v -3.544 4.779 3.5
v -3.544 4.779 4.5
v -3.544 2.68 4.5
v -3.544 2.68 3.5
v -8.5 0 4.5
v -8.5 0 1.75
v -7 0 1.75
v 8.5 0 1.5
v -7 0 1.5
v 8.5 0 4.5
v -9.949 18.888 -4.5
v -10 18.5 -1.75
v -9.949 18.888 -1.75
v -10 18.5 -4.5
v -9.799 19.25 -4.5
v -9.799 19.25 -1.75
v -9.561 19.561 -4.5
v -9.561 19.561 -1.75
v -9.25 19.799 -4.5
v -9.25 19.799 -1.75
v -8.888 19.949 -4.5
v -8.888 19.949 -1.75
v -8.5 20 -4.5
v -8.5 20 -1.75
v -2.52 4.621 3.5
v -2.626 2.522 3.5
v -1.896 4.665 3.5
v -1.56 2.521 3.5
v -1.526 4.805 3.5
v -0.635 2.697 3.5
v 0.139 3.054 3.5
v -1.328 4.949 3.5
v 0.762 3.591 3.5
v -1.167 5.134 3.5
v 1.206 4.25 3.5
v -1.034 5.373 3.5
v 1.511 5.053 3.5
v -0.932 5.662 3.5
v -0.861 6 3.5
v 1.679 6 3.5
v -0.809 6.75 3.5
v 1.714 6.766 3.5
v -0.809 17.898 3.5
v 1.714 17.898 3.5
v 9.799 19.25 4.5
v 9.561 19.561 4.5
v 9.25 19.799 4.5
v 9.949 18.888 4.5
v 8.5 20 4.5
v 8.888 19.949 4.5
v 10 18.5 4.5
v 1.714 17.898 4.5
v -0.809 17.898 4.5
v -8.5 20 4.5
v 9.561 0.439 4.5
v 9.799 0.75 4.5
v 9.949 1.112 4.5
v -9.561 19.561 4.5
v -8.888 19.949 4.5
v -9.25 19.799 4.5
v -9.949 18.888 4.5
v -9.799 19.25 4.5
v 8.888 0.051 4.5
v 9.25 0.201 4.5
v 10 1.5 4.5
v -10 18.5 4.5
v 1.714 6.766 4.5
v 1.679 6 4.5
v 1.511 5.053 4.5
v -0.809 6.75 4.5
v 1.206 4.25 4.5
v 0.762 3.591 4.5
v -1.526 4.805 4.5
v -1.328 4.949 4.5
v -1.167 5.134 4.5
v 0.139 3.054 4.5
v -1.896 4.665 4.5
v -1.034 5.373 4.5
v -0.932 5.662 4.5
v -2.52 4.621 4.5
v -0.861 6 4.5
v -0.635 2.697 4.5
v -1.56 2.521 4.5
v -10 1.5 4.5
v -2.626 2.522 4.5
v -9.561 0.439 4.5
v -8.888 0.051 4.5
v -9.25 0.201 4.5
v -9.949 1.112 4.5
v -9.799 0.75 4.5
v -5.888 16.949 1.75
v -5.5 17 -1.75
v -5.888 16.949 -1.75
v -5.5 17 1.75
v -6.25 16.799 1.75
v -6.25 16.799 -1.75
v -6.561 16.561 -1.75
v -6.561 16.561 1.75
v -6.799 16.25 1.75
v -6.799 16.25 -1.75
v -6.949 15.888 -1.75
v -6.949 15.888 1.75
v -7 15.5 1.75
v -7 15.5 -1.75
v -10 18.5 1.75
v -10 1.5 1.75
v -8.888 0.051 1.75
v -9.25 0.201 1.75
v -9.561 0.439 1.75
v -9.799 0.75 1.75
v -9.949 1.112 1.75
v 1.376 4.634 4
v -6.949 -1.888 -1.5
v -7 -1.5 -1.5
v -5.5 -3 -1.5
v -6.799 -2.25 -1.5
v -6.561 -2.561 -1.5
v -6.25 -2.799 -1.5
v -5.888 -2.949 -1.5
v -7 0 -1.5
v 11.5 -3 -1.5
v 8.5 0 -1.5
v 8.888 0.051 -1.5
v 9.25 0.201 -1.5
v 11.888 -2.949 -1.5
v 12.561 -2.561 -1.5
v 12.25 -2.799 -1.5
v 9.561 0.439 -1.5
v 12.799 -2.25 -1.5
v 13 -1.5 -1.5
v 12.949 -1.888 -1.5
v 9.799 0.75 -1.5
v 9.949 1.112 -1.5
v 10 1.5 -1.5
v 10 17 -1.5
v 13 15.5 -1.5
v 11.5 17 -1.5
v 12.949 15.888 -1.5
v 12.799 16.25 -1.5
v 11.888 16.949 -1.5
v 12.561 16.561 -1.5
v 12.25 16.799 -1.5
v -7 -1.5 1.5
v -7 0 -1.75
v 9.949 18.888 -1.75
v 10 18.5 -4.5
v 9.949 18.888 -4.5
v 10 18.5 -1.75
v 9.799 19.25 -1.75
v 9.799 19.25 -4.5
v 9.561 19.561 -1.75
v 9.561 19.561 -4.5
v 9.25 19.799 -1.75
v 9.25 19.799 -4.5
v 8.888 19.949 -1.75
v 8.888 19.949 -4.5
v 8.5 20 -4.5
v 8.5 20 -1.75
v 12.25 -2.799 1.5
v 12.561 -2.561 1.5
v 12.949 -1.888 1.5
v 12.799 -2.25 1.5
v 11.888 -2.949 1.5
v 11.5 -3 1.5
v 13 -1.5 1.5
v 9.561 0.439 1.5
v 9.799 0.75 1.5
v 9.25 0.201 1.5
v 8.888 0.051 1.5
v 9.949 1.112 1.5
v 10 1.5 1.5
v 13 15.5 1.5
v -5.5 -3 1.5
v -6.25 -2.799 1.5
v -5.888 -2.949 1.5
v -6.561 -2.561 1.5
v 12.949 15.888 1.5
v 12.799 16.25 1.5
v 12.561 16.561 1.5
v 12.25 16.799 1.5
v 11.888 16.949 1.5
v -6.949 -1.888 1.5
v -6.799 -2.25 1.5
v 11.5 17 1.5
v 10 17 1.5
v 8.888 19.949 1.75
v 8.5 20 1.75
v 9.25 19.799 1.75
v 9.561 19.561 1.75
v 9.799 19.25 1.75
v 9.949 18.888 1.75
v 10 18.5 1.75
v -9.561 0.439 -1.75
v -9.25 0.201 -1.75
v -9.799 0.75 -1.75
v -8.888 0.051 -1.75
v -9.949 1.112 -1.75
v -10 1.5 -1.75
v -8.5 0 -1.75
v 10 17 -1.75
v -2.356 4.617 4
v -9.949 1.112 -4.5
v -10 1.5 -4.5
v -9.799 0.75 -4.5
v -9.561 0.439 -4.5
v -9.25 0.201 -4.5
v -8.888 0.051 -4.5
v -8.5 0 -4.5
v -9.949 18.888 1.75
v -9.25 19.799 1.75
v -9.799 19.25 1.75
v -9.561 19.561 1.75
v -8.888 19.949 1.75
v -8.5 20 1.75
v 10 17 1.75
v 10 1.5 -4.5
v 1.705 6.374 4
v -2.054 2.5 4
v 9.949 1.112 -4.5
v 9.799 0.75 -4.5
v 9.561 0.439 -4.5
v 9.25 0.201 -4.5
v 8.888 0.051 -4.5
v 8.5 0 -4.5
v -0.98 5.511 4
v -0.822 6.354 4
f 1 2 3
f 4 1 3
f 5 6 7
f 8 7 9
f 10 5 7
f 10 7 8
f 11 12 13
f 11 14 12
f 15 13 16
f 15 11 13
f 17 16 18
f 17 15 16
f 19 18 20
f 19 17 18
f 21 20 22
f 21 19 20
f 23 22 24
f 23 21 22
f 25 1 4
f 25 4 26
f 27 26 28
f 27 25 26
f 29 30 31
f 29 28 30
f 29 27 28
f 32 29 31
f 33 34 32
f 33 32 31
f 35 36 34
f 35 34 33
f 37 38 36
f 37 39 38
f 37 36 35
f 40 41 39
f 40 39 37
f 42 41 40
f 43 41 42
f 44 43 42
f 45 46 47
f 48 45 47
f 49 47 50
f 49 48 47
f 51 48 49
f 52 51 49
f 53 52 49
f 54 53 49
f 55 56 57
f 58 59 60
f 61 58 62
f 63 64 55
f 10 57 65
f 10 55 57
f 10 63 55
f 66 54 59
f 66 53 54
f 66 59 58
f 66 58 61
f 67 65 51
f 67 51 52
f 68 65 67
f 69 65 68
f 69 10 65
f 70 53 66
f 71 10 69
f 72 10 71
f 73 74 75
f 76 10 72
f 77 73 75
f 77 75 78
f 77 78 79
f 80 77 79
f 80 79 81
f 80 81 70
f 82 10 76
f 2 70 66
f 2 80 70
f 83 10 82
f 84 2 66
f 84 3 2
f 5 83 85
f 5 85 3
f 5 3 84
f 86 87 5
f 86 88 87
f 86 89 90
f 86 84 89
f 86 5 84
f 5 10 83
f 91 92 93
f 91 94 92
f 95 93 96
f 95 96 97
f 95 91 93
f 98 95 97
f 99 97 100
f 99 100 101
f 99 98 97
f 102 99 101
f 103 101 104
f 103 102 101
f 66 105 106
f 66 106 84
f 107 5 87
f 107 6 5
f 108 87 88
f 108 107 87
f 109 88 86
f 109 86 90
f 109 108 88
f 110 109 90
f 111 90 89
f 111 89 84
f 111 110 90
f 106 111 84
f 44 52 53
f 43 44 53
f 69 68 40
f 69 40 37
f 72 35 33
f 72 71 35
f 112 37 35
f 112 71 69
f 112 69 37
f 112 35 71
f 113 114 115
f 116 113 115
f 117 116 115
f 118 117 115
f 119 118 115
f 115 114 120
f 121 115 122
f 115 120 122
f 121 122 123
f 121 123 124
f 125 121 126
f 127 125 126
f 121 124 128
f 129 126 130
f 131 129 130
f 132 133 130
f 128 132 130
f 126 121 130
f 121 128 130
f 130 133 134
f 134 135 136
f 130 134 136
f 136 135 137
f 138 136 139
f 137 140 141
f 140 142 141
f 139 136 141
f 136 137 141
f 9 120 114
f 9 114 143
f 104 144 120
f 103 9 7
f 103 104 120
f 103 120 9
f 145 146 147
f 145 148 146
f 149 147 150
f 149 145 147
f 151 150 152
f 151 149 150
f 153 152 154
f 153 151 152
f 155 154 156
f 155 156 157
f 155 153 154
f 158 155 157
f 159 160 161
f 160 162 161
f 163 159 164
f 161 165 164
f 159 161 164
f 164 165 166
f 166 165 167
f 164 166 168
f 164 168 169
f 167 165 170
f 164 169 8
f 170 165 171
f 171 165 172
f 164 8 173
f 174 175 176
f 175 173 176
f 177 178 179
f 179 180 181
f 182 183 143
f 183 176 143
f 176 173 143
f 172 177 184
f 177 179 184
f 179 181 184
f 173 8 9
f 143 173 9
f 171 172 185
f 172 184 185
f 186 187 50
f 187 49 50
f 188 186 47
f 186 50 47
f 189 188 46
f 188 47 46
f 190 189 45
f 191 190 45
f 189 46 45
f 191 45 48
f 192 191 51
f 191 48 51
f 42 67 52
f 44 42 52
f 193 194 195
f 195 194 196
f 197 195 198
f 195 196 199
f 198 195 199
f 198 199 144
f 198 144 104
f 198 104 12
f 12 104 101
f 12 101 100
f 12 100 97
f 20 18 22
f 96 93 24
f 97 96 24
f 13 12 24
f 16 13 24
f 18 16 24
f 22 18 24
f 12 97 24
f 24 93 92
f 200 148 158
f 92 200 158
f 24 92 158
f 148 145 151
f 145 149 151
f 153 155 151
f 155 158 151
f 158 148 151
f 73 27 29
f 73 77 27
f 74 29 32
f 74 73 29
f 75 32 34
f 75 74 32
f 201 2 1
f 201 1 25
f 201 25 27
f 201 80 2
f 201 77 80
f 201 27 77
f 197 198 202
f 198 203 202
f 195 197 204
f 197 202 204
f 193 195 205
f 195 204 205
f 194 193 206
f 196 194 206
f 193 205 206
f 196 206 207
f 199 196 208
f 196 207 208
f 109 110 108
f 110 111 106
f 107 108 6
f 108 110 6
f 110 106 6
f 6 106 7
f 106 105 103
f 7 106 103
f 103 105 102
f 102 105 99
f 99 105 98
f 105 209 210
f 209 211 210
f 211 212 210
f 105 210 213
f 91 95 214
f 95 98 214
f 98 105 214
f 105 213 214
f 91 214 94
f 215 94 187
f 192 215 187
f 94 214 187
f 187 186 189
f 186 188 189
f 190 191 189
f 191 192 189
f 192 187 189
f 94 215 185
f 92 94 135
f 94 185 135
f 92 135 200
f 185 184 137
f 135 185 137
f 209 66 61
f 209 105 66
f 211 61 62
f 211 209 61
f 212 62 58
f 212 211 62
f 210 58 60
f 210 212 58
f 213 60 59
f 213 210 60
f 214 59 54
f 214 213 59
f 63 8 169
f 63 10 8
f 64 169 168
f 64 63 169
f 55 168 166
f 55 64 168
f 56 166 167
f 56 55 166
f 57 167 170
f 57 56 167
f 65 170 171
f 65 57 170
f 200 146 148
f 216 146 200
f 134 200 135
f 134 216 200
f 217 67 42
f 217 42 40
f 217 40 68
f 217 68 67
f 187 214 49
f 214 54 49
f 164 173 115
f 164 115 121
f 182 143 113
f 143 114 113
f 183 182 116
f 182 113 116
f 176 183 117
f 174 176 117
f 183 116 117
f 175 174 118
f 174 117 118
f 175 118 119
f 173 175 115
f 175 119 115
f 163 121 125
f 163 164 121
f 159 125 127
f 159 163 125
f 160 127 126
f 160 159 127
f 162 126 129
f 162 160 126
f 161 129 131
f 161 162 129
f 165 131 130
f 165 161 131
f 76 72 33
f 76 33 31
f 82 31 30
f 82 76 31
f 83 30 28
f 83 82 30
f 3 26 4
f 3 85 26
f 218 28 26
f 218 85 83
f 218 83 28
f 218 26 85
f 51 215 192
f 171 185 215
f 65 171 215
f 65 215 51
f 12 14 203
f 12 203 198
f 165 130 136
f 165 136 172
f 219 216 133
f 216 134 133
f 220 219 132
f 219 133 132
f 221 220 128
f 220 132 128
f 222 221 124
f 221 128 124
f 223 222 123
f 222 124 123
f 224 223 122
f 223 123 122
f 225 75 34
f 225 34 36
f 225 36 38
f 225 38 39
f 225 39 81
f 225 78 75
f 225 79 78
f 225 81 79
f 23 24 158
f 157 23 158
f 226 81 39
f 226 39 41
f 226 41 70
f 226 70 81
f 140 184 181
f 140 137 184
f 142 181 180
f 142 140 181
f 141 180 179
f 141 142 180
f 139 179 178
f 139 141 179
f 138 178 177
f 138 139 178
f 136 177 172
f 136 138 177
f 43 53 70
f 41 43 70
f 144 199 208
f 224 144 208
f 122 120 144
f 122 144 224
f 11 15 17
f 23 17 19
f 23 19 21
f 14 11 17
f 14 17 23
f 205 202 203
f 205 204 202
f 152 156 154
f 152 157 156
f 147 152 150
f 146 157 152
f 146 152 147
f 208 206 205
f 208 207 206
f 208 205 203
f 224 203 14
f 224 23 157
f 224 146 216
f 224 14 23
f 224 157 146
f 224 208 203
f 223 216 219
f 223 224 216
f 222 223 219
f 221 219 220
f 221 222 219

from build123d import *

# Parameters (mm, degrees)
F0_W      = 14
F0_H      = 3
F0_W_2    = 3
F1_DEPTH  = 20
F2_DEPTH  = 3
F3_W      = 3
F3_H      = 3
F4_DEPTH  = 100
F5_W      = 3
F5_H      = 3.5
F6_DEPTH  = 100
F7_R      = 1.5
F9_DEPTH  = 1
F10_DEPTH = 1


with BuildPart() as f1:
    # F0 (on Front) → F1 (new body)
    with BuildSketch(Plane.XZ):
        Polygon((10, 1.5), (10, 4.5), (-10, 4.5), (-10, 1.5), (-7, 1.5), (7, 1.5), align=None)
        Rectangle(F0_W, F0_H)
        with Locations((11.5, 0)):
            Rectangle(F0_W_2, F0_H)
        with Locations((8.5, 0)):
            Rectangle(F0_W_2, F0_H)
        with Locations((-8.5, 0)):
            Rectangle(F0_W_2, F0_H)
        Polygon((10, -4.5), (10, -1.5), (7, -1.5), (-7, -1.5), (-10, -1.5), (-10, -4.5), align=None)
    extrude(amount=-F1_DEPTH)

    # F0 (on Front) → F2 (join)
    with BuildSketch(Plane.XZ):
        with Locations((-8.5, 0)):
            Rectangle(F0_W_2, F0_H)
        Rectangle(F0_W, F0_H)
        with Locations((8.5, 0)):
            Rectangle(F0_W_2, F0_H)
        with Locations((11.5, 0)):
            Rectangle(F0_W_2, F0_H)
    extrude(amount=F2_DEPTH)

    # F3 (on face) → F4 (cut)
    with BuildSketch(Plane.YZ.offset(13)):
        Polygon((23, -1.75), (23, 1.75), (17, 1.75), (17, 1.5), (20, 1.5), (20, -1.5), (17, -1.5), (17, -1.75), align=None)
        with Locations((18.5, 0)):
            Rectangle(F3_W, F3_H)
    extrude(amount=-F4_DEPTH, mode=Mode.SUBTRACT)

    # F5 (on face) → F6 (cut)
    with BuildSketch(Plane(origin=(0, 17, 0), x_dir=(-1, 0, 0), z_dir=(0, 1, 0))):
        with Locations((11.5, 0)):
            Rectangle(F5_W, F5_H)
        with Locations((8.5, 0)):
            Rectangle(F5_W, F5_H)
    extrude(amount=-F6_DEPTH, mode=Mode.SUBTRACT)

    # F7
    f7_edges = [f1.edges().sort_by_distance(p)[0] for p in [
        (-7, -3, 0),
        (13, -3, 0),
        (10, 0, 3),
        (10, 0, -3),
        (-10, 0, -3.125),
        (-10, 0, 3.125),
        (-7, 17, 0),
        (-10, 20, 3.125),
        (-10, 20, -3.125),
        (13, 17, 0),
        (10, 20, 3.125),
        (10, 20, -3.125),
    ]]
    fillet(f7_edges, radius=F7_R)

    # F8 (on face) → F9 (cut)
    with BuildSketch(Plane.XY.offset(4.5)):
        with BuildLine():
            add(Edge.make_bspline(
                [(1.6788760671, 6), (1.5308734468, 4.4721571739), (0.7623540077, 3.5911458333)],
                knots=[0.1925814922, 0.1925814922, 0.1925814922, 1, 1, 1], degree=2))
            Line((1.6788760671, 6), (-0.8607862189, 6))
            add(Edge.make_bspline(
                [(-1.1673334923, 5.1341145833), (-0.9450911222, 5.4549517504), (-0.8607862189, 6)],
                knots=[0, 0, 0, 0.6206623282, 0.6206623282, 0.6206623282], degree=2))
            add(Edge.make_bspline(
                [(-2.3561355757, 4.6171875), (-1.525406409, 4.6171875), (-1.1673334923, 5.1341145833)],
                knots=[0, 0, 0, 1, 1, 1], degree=2))
            add(Edge.make_bspline(
                [(-3.5436355757, 4.7786458333), (-2.892593909, 4.6171875), (-2.3561355757, 4.6171875)],
                knots=[0, 0, 0, 1, 1, 1], degree=2))
            Line((-3.5436355757, 4.7786458333), (-3.5436355757, 2.6796875))
            add(Edge.make_bspline(
                [(-2.0540522423, 2.5), (-2.908218909, 2.5), (-3.5436355757, 2.6796875)],
                knots=[0, 0, 0, 1, 1, 1], degree=2))
            add(Edge.make_bspline(
                [(0.7623540077, 3.5911458333), (-0.189468909, 2.5), (-2.0540522423, 2.5)],
                knots=[0, 0, 0, 1, 1, 1], degree=2))
        make_face()
    extrude(amount=-F9_DEPTH, mode=Mode.SUBTRACT)

    # F8 (on face) → F10 (cut)
    with BuildSketch(Plane.XY.offset(4.5)):
        with BuildLine():
            Line((-0.8607862189, 6), (1.6788760671, 6))
            add(Edge.make_bspline(
                [(1.7141769243, 6.765625), (1.7141769243, 6.364413558), (1.6788760671, 6)],
                knots=[0, 0, 0, 0.1925814922, 0.1925814922, 0.1925814922], degree=2))
            Line((1.7141769243, 6.765625), (1.7141769243, 17.8984375))
            Line((1.7141769243, 17.8984375), (-0.8092605757, 17.8984375))
            Line((-0.8092605757, 17.8984375), (-0.8092605757, 6.75))
            add(Edge.make_bspline(
                [(-0.8607862189, 6), (-0.8092605757, 6.3331237045), (-0.8092605757, 6.75)],
                knots=[0.6206623282, 0.6206623282, 0.6206623282, 1, 1, 1], degree=2))
        make_face()
    extrude(amount=-F10_DEPTH, mode=Mode.SUBTRACT)


solid = f1.part
